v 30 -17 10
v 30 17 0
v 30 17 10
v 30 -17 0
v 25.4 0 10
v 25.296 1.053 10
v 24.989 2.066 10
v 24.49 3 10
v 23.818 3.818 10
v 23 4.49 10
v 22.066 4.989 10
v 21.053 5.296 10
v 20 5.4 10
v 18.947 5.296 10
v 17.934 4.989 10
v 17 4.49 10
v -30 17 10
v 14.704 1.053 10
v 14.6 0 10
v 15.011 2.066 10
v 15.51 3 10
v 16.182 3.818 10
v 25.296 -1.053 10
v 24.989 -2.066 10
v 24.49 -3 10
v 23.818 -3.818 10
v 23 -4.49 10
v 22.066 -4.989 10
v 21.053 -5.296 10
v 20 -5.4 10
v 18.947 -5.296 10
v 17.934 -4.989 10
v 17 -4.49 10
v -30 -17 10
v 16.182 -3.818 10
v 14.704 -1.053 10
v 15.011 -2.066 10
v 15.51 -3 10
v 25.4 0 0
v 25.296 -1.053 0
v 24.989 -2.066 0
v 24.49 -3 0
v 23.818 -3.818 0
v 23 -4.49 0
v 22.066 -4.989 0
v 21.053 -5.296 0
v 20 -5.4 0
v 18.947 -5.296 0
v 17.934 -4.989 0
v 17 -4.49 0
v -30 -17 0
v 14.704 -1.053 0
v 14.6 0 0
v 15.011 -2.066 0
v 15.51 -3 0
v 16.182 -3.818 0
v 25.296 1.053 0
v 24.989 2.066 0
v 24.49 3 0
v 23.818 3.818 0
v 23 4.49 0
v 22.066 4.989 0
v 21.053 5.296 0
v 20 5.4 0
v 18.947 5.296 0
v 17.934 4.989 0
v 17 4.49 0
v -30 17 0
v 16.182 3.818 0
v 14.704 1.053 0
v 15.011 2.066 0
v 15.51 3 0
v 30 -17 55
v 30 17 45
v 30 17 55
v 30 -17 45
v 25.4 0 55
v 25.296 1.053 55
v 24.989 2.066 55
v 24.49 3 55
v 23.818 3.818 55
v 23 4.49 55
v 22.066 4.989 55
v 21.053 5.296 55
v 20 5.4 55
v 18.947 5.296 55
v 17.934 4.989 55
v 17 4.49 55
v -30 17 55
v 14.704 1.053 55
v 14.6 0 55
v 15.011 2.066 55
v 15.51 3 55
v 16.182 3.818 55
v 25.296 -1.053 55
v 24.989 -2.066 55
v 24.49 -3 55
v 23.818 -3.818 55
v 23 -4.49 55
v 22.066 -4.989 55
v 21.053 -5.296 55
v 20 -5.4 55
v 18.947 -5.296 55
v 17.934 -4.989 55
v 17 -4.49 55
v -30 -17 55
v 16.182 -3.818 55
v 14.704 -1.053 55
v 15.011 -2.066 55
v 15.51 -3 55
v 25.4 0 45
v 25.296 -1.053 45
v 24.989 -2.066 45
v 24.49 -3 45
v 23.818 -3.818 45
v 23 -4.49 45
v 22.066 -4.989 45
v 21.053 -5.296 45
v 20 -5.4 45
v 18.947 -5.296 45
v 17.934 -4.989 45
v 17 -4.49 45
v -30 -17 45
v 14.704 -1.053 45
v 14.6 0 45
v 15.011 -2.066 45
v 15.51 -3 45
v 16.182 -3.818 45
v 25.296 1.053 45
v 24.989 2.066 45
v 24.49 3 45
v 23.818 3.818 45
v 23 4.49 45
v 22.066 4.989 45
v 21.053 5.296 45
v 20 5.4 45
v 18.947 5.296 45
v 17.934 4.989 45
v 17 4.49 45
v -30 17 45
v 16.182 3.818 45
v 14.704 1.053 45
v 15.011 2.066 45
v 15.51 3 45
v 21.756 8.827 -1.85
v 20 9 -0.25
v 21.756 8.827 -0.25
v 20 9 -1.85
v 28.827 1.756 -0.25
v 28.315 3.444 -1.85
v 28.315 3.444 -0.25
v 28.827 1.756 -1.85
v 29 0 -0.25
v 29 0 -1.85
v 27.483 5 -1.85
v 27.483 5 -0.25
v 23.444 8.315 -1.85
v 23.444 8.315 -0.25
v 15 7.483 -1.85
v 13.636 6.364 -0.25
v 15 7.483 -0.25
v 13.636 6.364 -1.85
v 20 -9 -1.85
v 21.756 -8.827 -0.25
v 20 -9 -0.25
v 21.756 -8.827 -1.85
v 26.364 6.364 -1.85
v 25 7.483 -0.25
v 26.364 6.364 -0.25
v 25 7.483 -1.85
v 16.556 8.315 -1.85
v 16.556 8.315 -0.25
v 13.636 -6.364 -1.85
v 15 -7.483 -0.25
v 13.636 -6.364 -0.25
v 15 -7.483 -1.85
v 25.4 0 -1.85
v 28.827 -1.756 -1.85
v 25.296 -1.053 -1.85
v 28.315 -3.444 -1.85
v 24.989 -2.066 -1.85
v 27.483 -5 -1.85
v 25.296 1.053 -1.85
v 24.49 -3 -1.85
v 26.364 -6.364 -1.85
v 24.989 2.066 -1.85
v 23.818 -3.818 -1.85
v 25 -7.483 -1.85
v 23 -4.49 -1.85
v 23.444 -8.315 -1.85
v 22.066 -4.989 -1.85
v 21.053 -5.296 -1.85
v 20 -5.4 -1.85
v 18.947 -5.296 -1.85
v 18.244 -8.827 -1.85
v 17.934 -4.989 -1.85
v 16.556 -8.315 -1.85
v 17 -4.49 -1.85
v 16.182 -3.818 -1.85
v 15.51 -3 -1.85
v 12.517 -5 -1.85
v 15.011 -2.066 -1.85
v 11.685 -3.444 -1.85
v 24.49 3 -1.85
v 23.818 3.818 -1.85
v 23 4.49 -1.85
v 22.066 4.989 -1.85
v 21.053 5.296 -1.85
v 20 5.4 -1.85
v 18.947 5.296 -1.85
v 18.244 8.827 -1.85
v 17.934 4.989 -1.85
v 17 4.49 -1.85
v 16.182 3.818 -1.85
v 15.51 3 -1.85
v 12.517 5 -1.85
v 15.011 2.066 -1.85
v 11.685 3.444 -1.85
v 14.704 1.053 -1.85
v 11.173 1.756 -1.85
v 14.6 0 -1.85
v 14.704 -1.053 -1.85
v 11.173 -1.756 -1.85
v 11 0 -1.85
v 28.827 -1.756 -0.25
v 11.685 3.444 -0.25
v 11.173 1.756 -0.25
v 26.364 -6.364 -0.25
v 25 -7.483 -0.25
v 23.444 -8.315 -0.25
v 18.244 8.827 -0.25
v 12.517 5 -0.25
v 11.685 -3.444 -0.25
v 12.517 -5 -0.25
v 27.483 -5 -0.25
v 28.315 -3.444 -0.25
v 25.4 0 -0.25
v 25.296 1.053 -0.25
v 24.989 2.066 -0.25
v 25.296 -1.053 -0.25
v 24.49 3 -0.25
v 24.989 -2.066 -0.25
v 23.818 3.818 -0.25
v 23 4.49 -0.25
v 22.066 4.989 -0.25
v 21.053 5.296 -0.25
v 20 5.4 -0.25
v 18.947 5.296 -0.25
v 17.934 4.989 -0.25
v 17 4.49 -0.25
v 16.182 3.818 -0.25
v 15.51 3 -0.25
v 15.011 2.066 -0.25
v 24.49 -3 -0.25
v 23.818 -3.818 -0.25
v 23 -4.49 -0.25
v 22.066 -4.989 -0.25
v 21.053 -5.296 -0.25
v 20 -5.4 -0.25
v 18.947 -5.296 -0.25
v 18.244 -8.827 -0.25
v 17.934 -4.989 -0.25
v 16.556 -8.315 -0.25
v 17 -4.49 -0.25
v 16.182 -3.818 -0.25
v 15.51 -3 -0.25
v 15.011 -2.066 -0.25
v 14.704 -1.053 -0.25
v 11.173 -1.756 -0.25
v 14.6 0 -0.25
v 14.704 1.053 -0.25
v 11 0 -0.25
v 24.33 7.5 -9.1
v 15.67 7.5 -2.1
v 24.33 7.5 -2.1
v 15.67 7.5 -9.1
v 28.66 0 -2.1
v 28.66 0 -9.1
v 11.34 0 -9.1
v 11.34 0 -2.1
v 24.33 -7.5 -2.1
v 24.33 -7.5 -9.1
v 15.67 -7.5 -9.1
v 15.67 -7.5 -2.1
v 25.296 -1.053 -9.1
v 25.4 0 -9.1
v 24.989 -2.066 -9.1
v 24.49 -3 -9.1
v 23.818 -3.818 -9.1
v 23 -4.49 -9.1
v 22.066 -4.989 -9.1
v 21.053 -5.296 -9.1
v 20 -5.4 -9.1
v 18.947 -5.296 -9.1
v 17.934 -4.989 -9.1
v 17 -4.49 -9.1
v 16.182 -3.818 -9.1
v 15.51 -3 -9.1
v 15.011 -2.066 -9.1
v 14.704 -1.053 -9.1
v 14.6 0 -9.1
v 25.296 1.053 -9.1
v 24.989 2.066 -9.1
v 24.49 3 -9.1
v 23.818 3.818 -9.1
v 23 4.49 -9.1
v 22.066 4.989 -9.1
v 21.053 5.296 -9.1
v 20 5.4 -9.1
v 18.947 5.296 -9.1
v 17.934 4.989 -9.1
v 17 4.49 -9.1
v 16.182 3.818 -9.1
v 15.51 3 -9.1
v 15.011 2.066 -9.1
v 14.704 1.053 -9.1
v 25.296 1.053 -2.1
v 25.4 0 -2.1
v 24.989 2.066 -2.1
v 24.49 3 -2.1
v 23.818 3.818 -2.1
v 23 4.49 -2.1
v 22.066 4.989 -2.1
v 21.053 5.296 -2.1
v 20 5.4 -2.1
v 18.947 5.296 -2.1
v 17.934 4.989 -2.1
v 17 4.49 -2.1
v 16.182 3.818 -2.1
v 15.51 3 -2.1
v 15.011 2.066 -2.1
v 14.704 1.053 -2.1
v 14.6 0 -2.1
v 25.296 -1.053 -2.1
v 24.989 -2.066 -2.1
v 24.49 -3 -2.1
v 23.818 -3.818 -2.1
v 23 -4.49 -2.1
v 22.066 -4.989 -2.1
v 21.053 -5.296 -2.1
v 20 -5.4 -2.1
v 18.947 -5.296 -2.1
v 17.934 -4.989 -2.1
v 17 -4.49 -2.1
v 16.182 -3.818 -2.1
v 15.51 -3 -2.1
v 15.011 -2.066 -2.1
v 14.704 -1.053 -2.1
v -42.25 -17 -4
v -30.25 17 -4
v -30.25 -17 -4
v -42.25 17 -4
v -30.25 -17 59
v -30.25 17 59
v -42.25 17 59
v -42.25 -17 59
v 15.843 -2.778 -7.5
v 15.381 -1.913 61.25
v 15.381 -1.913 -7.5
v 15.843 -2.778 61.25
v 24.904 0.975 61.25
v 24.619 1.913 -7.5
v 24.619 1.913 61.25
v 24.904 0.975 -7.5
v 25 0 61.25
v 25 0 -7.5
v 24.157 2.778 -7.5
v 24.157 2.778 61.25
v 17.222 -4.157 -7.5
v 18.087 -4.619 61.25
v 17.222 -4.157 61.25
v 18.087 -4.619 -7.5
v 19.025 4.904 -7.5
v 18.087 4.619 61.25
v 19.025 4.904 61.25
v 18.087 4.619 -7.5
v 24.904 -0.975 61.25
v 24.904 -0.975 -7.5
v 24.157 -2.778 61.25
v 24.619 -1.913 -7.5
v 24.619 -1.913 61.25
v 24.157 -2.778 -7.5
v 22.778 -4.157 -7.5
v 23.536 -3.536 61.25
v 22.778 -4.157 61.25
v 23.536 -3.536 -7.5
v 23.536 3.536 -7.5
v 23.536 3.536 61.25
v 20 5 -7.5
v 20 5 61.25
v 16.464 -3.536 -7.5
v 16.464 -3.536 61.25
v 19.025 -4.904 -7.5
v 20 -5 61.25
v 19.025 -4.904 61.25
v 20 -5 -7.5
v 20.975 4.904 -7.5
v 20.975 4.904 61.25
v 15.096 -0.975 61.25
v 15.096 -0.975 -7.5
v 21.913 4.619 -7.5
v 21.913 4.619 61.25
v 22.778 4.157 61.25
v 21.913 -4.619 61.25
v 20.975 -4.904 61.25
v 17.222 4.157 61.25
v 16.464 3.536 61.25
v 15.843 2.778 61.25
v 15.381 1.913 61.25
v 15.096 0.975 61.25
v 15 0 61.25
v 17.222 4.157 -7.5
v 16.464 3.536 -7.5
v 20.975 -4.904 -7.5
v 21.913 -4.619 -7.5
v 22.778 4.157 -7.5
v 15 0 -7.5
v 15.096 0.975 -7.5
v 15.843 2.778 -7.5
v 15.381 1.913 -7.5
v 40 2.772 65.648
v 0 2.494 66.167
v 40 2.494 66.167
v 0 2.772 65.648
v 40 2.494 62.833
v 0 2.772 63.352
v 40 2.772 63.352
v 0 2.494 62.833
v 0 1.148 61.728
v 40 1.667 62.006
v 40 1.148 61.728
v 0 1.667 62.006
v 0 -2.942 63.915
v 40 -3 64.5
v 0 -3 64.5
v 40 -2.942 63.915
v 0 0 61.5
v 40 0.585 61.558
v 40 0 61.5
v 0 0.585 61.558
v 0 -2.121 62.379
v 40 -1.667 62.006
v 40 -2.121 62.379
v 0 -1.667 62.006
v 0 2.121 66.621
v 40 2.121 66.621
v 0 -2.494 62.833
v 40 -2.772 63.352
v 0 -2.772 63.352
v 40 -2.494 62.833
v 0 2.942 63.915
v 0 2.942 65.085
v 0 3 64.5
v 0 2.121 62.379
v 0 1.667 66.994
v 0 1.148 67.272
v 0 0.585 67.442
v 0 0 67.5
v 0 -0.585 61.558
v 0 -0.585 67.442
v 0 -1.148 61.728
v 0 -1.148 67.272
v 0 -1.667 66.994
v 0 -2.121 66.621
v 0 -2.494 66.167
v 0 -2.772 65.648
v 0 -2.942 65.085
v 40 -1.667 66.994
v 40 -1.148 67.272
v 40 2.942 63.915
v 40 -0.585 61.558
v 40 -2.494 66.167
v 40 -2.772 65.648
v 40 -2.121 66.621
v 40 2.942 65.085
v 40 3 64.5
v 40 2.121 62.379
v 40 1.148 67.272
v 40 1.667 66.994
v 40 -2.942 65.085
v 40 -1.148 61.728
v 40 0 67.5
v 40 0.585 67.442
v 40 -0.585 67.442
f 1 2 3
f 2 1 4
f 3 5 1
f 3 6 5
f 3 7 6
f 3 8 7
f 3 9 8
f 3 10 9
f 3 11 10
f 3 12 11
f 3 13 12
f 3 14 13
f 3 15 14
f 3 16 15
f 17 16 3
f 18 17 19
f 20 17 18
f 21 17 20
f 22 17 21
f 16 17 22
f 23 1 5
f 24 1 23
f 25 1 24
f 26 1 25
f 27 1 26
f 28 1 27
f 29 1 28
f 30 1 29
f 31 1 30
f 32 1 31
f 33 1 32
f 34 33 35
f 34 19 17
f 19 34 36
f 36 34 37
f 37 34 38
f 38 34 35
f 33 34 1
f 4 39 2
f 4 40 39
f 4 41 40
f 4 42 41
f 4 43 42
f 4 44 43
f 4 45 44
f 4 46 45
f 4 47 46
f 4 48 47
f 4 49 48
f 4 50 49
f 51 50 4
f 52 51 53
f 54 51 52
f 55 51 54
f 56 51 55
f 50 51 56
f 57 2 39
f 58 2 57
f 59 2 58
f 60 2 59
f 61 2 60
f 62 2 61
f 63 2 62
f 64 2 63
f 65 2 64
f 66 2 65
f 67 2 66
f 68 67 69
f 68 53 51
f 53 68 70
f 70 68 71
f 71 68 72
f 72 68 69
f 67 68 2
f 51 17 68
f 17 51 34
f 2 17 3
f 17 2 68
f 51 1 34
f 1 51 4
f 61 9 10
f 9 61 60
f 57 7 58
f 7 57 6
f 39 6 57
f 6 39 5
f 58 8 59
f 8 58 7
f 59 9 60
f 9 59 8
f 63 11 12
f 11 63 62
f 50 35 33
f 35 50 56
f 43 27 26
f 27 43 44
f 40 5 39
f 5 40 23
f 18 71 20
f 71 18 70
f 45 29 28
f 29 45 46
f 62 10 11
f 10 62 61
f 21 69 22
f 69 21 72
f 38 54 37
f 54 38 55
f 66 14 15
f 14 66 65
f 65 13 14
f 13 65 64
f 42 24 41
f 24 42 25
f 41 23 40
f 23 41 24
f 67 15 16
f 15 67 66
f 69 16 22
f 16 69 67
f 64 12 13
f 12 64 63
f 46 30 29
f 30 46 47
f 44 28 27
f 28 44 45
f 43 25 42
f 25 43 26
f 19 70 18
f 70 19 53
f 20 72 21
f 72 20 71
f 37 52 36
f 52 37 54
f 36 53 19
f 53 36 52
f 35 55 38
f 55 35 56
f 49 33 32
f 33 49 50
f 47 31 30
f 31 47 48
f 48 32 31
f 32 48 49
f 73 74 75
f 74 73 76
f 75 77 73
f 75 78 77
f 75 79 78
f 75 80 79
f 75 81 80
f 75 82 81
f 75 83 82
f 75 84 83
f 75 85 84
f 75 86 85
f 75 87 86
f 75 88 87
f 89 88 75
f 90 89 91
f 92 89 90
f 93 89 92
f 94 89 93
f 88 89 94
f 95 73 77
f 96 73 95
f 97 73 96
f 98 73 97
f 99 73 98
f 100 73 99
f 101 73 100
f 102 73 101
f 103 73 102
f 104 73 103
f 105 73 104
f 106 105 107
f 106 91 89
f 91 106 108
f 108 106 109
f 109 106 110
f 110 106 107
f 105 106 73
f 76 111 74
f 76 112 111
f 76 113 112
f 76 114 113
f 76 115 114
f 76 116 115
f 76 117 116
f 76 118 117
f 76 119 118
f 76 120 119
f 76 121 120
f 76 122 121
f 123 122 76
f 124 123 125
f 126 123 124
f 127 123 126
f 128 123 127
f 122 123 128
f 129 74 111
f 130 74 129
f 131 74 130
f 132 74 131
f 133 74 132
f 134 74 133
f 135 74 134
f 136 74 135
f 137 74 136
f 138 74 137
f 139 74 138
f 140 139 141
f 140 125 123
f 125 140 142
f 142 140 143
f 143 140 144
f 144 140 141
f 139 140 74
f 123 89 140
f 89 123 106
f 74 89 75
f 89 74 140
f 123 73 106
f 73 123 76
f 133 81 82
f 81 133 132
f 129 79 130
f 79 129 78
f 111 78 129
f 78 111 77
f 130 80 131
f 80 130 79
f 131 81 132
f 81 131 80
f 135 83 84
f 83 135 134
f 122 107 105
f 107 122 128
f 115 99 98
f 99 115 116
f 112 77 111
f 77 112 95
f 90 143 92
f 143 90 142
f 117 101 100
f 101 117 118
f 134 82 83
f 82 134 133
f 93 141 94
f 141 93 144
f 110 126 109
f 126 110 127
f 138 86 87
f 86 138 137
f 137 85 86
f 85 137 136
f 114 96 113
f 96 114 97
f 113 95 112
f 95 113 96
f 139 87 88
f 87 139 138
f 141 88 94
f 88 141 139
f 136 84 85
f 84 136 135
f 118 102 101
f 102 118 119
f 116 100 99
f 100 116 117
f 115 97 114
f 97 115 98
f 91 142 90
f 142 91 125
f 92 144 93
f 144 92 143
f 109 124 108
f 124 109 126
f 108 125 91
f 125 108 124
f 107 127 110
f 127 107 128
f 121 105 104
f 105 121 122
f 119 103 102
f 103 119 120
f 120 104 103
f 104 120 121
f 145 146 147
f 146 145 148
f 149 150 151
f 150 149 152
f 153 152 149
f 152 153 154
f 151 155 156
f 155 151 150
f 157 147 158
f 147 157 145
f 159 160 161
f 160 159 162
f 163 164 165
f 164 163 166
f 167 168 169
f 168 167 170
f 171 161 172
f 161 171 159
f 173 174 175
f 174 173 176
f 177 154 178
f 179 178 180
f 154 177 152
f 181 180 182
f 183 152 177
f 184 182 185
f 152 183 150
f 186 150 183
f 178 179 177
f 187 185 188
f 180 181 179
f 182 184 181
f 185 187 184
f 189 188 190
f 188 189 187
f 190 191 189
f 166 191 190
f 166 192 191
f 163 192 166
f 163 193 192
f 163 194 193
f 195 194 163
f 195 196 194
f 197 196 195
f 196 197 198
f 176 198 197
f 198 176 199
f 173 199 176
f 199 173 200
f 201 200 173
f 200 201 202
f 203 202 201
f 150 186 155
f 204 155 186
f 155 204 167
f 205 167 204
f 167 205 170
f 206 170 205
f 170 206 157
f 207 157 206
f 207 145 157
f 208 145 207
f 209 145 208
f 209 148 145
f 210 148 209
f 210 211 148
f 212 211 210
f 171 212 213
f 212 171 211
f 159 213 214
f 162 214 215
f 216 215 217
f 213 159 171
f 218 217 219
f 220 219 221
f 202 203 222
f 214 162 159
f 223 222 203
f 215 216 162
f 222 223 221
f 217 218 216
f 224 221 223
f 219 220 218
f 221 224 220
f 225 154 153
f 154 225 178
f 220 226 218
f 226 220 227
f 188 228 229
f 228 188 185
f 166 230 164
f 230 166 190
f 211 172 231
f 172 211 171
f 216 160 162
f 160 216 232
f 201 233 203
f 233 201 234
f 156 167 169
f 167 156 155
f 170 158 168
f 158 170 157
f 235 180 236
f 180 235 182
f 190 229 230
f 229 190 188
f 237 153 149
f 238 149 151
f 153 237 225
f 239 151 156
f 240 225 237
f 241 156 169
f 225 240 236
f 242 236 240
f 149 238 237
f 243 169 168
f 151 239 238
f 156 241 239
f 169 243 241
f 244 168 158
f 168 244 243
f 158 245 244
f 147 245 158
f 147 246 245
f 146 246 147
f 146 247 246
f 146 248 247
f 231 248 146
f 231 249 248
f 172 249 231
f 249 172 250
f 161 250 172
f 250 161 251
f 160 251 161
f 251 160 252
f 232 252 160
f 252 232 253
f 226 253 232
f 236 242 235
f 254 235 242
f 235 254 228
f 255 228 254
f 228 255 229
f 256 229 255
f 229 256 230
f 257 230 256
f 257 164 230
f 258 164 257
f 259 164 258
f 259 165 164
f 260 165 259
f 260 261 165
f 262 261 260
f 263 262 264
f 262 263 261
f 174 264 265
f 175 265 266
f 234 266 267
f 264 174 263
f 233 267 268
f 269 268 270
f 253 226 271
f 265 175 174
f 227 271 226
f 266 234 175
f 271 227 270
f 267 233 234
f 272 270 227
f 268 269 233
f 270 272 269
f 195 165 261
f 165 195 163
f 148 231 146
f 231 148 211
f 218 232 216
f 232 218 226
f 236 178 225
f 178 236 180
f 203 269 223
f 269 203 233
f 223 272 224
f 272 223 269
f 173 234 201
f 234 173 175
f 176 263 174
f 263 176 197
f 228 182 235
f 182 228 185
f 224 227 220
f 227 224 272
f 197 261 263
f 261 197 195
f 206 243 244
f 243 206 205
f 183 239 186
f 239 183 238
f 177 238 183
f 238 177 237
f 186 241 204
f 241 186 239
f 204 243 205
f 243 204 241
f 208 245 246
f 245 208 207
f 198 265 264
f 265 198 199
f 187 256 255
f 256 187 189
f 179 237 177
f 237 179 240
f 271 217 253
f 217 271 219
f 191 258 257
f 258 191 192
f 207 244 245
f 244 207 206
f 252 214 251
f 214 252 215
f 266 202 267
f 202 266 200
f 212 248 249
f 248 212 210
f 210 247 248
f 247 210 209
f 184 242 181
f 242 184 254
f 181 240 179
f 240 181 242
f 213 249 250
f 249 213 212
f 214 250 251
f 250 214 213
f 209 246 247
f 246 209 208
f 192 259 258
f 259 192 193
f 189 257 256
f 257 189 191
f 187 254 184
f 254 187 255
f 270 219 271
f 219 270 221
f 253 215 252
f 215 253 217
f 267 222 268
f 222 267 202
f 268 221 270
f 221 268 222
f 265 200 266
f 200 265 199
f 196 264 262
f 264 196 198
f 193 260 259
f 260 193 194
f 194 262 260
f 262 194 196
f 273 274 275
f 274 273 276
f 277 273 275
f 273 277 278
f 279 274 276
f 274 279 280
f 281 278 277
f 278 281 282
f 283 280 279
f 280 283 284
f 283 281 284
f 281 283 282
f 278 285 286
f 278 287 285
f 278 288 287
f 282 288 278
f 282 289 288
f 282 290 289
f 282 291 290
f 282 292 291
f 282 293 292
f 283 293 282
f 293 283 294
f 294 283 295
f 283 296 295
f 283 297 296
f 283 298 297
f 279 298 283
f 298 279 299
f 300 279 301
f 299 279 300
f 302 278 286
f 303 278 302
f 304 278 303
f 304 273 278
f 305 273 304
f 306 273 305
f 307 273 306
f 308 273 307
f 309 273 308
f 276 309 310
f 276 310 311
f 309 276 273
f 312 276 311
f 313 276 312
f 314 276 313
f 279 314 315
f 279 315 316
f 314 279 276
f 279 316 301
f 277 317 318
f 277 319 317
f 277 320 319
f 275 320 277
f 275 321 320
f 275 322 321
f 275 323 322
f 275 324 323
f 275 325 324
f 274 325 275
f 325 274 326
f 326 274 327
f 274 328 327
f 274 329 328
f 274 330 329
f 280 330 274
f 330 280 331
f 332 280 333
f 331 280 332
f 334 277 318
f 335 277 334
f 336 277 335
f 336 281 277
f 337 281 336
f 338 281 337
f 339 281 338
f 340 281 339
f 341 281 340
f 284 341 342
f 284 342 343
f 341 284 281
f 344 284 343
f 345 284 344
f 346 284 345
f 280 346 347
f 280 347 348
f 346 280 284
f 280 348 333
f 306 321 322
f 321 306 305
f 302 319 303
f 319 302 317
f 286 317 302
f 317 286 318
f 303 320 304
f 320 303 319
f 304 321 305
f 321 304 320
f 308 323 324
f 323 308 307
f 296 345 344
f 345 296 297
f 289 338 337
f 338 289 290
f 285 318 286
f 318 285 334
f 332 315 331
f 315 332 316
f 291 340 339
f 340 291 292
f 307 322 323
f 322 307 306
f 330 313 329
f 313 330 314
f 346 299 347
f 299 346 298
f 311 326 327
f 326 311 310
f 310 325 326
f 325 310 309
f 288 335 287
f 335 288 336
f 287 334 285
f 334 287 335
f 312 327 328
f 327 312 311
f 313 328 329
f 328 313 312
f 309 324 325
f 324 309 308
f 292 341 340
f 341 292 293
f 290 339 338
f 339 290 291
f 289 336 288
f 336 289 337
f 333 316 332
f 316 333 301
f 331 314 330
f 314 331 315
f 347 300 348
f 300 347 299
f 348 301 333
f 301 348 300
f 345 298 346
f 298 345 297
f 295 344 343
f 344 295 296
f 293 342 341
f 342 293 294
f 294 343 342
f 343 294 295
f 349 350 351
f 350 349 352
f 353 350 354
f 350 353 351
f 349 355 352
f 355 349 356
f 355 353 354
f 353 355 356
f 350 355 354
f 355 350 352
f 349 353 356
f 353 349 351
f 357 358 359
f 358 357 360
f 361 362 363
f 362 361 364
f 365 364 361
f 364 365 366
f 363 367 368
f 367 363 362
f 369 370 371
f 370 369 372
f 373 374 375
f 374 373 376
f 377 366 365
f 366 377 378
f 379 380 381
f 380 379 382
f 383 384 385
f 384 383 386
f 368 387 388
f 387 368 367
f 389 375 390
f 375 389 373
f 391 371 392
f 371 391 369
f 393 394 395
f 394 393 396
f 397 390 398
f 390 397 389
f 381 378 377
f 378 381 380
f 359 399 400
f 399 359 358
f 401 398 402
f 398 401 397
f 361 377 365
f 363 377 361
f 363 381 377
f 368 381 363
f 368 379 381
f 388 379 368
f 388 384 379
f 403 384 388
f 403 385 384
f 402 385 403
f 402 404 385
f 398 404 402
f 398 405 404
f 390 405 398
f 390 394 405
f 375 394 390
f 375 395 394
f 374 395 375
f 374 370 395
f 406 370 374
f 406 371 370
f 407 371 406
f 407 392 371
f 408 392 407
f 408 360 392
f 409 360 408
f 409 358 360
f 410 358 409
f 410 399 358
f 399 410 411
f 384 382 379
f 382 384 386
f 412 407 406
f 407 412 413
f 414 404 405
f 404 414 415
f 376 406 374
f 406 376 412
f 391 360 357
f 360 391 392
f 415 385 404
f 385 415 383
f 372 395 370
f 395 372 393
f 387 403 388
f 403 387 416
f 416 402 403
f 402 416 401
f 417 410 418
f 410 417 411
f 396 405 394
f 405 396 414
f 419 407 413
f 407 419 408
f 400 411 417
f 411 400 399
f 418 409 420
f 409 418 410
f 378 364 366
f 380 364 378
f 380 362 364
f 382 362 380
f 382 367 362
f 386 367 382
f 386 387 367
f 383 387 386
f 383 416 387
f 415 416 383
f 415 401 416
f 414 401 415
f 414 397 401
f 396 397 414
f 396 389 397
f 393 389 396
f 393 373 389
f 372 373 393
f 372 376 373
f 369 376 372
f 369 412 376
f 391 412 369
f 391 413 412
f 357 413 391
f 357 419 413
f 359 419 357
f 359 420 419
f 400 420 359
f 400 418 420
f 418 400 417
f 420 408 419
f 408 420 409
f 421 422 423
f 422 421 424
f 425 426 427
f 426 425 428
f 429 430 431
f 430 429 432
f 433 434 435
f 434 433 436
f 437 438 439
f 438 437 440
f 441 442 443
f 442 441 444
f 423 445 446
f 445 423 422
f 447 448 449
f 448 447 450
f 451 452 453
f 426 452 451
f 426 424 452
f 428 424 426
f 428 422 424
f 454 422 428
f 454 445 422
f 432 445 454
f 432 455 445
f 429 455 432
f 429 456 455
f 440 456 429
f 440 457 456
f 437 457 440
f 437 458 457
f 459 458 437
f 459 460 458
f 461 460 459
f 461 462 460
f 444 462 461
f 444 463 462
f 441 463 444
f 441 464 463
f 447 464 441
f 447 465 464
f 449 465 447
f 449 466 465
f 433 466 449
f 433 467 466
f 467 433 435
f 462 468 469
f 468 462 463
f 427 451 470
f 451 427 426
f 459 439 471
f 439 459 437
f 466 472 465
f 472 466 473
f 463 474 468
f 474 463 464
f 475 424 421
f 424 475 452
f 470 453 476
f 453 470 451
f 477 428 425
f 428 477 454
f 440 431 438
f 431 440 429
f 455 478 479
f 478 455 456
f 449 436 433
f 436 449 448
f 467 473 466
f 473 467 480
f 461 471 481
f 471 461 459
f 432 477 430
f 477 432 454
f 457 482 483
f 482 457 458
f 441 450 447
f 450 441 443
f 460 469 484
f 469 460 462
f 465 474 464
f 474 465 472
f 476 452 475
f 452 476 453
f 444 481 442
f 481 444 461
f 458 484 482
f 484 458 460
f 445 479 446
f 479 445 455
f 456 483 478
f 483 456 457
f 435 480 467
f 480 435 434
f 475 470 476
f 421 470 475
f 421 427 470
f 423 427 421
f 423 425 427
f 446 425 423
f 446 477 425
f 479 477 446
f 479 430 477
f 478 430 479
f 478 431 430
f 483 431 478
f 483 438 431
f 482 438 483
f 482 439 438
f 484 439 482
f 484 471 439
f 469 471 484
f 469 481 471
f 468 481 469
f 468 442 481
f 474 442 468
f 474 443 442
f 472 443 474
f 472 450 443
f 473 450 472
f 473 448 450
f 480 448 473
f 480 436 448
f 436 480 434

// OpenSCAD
$fn = 32;

// ------------------------------------------------------------------------
// C clamp: throat 45 mm, screw d10
// Every part is its own module, assembly() places every instance.
// ------------------------------------------------------------------------

// --- part 1 ---
module clamp_arm() {
  difference() {
    translate([-30, -17, 0]) cube([60, 34, 10]);
    translate([20, 0, -1]) cylinder(h = 12, d = 10.8);
  }
}

// --- part 2 ---
module clamp_spine() {
  difference() {
    translate([-31.5, -17, 0]) cube([63, 34, 12]);
  }
}

// --- part 3 ---
module clamp_screw() {
  translate([0, 0, -34.375]) cylinder(h = 68.75, d = 10);
}

// --- part 4 ---
module clamp_washer() {
  difference() {
      translate([0, 0, 0]) cylinder(h = 1.6, d = 18);
      translate([0, 0, -1]) cylinder(h = 3.6, d = 10.8);
    }
}

// --- part 5 ---
module clamp_nut() {
  difference() {
    linear_extrude(height = 7) polygon(points = [[8.66, 0], [4.33, 7.5], [-4.33, 7.5], [-8.66, 0], [-4.33, -7.5], [4.33, -7.5]]);
    translate([0, 0, -1]) cylinder(h = 9, d = 10.8);
  }
}

// --- part 6 ---
module tommy_bar() {
  translate([0, 0, -20]) cylinder(h = 40, d = 6);
}

// --- assembly ---
module assembly() {
  color([0.80, 0.24, 0.20]) translate([0, 0, 0]) rotate([0, 0, 0]) clamp_arm();
  color([0.20, 0.45, 0.75]) translate([0, 0, 45]) rotate([0, 0, 0]) clamp_arm();
  color([0.25, 0.62, 0.32]) translate([-42.25, 0, 27.5]) rotate([0, 90, 0]) clamp_spine();
  color([0.92, 0.70, 0.18]) translate([20, 0, 26.875]) rotate([0, 0, 0]) clamp_screw();
  color([0.58, 0.35, 0.70]) translate([20, 0, -1.85]) rotate([0, 0, 0]) clamp_washer();
  color([0.16, 0.66, 0.66]) translate([20, 0, -9.1]) rotate([0, 0, 0]) clamp_nut();
  color([0.85, 0.48, 0.18]) translate([20, 0, 64.5]) rotate([0, 90, 0]) tommy_bar();
}

assembly();
